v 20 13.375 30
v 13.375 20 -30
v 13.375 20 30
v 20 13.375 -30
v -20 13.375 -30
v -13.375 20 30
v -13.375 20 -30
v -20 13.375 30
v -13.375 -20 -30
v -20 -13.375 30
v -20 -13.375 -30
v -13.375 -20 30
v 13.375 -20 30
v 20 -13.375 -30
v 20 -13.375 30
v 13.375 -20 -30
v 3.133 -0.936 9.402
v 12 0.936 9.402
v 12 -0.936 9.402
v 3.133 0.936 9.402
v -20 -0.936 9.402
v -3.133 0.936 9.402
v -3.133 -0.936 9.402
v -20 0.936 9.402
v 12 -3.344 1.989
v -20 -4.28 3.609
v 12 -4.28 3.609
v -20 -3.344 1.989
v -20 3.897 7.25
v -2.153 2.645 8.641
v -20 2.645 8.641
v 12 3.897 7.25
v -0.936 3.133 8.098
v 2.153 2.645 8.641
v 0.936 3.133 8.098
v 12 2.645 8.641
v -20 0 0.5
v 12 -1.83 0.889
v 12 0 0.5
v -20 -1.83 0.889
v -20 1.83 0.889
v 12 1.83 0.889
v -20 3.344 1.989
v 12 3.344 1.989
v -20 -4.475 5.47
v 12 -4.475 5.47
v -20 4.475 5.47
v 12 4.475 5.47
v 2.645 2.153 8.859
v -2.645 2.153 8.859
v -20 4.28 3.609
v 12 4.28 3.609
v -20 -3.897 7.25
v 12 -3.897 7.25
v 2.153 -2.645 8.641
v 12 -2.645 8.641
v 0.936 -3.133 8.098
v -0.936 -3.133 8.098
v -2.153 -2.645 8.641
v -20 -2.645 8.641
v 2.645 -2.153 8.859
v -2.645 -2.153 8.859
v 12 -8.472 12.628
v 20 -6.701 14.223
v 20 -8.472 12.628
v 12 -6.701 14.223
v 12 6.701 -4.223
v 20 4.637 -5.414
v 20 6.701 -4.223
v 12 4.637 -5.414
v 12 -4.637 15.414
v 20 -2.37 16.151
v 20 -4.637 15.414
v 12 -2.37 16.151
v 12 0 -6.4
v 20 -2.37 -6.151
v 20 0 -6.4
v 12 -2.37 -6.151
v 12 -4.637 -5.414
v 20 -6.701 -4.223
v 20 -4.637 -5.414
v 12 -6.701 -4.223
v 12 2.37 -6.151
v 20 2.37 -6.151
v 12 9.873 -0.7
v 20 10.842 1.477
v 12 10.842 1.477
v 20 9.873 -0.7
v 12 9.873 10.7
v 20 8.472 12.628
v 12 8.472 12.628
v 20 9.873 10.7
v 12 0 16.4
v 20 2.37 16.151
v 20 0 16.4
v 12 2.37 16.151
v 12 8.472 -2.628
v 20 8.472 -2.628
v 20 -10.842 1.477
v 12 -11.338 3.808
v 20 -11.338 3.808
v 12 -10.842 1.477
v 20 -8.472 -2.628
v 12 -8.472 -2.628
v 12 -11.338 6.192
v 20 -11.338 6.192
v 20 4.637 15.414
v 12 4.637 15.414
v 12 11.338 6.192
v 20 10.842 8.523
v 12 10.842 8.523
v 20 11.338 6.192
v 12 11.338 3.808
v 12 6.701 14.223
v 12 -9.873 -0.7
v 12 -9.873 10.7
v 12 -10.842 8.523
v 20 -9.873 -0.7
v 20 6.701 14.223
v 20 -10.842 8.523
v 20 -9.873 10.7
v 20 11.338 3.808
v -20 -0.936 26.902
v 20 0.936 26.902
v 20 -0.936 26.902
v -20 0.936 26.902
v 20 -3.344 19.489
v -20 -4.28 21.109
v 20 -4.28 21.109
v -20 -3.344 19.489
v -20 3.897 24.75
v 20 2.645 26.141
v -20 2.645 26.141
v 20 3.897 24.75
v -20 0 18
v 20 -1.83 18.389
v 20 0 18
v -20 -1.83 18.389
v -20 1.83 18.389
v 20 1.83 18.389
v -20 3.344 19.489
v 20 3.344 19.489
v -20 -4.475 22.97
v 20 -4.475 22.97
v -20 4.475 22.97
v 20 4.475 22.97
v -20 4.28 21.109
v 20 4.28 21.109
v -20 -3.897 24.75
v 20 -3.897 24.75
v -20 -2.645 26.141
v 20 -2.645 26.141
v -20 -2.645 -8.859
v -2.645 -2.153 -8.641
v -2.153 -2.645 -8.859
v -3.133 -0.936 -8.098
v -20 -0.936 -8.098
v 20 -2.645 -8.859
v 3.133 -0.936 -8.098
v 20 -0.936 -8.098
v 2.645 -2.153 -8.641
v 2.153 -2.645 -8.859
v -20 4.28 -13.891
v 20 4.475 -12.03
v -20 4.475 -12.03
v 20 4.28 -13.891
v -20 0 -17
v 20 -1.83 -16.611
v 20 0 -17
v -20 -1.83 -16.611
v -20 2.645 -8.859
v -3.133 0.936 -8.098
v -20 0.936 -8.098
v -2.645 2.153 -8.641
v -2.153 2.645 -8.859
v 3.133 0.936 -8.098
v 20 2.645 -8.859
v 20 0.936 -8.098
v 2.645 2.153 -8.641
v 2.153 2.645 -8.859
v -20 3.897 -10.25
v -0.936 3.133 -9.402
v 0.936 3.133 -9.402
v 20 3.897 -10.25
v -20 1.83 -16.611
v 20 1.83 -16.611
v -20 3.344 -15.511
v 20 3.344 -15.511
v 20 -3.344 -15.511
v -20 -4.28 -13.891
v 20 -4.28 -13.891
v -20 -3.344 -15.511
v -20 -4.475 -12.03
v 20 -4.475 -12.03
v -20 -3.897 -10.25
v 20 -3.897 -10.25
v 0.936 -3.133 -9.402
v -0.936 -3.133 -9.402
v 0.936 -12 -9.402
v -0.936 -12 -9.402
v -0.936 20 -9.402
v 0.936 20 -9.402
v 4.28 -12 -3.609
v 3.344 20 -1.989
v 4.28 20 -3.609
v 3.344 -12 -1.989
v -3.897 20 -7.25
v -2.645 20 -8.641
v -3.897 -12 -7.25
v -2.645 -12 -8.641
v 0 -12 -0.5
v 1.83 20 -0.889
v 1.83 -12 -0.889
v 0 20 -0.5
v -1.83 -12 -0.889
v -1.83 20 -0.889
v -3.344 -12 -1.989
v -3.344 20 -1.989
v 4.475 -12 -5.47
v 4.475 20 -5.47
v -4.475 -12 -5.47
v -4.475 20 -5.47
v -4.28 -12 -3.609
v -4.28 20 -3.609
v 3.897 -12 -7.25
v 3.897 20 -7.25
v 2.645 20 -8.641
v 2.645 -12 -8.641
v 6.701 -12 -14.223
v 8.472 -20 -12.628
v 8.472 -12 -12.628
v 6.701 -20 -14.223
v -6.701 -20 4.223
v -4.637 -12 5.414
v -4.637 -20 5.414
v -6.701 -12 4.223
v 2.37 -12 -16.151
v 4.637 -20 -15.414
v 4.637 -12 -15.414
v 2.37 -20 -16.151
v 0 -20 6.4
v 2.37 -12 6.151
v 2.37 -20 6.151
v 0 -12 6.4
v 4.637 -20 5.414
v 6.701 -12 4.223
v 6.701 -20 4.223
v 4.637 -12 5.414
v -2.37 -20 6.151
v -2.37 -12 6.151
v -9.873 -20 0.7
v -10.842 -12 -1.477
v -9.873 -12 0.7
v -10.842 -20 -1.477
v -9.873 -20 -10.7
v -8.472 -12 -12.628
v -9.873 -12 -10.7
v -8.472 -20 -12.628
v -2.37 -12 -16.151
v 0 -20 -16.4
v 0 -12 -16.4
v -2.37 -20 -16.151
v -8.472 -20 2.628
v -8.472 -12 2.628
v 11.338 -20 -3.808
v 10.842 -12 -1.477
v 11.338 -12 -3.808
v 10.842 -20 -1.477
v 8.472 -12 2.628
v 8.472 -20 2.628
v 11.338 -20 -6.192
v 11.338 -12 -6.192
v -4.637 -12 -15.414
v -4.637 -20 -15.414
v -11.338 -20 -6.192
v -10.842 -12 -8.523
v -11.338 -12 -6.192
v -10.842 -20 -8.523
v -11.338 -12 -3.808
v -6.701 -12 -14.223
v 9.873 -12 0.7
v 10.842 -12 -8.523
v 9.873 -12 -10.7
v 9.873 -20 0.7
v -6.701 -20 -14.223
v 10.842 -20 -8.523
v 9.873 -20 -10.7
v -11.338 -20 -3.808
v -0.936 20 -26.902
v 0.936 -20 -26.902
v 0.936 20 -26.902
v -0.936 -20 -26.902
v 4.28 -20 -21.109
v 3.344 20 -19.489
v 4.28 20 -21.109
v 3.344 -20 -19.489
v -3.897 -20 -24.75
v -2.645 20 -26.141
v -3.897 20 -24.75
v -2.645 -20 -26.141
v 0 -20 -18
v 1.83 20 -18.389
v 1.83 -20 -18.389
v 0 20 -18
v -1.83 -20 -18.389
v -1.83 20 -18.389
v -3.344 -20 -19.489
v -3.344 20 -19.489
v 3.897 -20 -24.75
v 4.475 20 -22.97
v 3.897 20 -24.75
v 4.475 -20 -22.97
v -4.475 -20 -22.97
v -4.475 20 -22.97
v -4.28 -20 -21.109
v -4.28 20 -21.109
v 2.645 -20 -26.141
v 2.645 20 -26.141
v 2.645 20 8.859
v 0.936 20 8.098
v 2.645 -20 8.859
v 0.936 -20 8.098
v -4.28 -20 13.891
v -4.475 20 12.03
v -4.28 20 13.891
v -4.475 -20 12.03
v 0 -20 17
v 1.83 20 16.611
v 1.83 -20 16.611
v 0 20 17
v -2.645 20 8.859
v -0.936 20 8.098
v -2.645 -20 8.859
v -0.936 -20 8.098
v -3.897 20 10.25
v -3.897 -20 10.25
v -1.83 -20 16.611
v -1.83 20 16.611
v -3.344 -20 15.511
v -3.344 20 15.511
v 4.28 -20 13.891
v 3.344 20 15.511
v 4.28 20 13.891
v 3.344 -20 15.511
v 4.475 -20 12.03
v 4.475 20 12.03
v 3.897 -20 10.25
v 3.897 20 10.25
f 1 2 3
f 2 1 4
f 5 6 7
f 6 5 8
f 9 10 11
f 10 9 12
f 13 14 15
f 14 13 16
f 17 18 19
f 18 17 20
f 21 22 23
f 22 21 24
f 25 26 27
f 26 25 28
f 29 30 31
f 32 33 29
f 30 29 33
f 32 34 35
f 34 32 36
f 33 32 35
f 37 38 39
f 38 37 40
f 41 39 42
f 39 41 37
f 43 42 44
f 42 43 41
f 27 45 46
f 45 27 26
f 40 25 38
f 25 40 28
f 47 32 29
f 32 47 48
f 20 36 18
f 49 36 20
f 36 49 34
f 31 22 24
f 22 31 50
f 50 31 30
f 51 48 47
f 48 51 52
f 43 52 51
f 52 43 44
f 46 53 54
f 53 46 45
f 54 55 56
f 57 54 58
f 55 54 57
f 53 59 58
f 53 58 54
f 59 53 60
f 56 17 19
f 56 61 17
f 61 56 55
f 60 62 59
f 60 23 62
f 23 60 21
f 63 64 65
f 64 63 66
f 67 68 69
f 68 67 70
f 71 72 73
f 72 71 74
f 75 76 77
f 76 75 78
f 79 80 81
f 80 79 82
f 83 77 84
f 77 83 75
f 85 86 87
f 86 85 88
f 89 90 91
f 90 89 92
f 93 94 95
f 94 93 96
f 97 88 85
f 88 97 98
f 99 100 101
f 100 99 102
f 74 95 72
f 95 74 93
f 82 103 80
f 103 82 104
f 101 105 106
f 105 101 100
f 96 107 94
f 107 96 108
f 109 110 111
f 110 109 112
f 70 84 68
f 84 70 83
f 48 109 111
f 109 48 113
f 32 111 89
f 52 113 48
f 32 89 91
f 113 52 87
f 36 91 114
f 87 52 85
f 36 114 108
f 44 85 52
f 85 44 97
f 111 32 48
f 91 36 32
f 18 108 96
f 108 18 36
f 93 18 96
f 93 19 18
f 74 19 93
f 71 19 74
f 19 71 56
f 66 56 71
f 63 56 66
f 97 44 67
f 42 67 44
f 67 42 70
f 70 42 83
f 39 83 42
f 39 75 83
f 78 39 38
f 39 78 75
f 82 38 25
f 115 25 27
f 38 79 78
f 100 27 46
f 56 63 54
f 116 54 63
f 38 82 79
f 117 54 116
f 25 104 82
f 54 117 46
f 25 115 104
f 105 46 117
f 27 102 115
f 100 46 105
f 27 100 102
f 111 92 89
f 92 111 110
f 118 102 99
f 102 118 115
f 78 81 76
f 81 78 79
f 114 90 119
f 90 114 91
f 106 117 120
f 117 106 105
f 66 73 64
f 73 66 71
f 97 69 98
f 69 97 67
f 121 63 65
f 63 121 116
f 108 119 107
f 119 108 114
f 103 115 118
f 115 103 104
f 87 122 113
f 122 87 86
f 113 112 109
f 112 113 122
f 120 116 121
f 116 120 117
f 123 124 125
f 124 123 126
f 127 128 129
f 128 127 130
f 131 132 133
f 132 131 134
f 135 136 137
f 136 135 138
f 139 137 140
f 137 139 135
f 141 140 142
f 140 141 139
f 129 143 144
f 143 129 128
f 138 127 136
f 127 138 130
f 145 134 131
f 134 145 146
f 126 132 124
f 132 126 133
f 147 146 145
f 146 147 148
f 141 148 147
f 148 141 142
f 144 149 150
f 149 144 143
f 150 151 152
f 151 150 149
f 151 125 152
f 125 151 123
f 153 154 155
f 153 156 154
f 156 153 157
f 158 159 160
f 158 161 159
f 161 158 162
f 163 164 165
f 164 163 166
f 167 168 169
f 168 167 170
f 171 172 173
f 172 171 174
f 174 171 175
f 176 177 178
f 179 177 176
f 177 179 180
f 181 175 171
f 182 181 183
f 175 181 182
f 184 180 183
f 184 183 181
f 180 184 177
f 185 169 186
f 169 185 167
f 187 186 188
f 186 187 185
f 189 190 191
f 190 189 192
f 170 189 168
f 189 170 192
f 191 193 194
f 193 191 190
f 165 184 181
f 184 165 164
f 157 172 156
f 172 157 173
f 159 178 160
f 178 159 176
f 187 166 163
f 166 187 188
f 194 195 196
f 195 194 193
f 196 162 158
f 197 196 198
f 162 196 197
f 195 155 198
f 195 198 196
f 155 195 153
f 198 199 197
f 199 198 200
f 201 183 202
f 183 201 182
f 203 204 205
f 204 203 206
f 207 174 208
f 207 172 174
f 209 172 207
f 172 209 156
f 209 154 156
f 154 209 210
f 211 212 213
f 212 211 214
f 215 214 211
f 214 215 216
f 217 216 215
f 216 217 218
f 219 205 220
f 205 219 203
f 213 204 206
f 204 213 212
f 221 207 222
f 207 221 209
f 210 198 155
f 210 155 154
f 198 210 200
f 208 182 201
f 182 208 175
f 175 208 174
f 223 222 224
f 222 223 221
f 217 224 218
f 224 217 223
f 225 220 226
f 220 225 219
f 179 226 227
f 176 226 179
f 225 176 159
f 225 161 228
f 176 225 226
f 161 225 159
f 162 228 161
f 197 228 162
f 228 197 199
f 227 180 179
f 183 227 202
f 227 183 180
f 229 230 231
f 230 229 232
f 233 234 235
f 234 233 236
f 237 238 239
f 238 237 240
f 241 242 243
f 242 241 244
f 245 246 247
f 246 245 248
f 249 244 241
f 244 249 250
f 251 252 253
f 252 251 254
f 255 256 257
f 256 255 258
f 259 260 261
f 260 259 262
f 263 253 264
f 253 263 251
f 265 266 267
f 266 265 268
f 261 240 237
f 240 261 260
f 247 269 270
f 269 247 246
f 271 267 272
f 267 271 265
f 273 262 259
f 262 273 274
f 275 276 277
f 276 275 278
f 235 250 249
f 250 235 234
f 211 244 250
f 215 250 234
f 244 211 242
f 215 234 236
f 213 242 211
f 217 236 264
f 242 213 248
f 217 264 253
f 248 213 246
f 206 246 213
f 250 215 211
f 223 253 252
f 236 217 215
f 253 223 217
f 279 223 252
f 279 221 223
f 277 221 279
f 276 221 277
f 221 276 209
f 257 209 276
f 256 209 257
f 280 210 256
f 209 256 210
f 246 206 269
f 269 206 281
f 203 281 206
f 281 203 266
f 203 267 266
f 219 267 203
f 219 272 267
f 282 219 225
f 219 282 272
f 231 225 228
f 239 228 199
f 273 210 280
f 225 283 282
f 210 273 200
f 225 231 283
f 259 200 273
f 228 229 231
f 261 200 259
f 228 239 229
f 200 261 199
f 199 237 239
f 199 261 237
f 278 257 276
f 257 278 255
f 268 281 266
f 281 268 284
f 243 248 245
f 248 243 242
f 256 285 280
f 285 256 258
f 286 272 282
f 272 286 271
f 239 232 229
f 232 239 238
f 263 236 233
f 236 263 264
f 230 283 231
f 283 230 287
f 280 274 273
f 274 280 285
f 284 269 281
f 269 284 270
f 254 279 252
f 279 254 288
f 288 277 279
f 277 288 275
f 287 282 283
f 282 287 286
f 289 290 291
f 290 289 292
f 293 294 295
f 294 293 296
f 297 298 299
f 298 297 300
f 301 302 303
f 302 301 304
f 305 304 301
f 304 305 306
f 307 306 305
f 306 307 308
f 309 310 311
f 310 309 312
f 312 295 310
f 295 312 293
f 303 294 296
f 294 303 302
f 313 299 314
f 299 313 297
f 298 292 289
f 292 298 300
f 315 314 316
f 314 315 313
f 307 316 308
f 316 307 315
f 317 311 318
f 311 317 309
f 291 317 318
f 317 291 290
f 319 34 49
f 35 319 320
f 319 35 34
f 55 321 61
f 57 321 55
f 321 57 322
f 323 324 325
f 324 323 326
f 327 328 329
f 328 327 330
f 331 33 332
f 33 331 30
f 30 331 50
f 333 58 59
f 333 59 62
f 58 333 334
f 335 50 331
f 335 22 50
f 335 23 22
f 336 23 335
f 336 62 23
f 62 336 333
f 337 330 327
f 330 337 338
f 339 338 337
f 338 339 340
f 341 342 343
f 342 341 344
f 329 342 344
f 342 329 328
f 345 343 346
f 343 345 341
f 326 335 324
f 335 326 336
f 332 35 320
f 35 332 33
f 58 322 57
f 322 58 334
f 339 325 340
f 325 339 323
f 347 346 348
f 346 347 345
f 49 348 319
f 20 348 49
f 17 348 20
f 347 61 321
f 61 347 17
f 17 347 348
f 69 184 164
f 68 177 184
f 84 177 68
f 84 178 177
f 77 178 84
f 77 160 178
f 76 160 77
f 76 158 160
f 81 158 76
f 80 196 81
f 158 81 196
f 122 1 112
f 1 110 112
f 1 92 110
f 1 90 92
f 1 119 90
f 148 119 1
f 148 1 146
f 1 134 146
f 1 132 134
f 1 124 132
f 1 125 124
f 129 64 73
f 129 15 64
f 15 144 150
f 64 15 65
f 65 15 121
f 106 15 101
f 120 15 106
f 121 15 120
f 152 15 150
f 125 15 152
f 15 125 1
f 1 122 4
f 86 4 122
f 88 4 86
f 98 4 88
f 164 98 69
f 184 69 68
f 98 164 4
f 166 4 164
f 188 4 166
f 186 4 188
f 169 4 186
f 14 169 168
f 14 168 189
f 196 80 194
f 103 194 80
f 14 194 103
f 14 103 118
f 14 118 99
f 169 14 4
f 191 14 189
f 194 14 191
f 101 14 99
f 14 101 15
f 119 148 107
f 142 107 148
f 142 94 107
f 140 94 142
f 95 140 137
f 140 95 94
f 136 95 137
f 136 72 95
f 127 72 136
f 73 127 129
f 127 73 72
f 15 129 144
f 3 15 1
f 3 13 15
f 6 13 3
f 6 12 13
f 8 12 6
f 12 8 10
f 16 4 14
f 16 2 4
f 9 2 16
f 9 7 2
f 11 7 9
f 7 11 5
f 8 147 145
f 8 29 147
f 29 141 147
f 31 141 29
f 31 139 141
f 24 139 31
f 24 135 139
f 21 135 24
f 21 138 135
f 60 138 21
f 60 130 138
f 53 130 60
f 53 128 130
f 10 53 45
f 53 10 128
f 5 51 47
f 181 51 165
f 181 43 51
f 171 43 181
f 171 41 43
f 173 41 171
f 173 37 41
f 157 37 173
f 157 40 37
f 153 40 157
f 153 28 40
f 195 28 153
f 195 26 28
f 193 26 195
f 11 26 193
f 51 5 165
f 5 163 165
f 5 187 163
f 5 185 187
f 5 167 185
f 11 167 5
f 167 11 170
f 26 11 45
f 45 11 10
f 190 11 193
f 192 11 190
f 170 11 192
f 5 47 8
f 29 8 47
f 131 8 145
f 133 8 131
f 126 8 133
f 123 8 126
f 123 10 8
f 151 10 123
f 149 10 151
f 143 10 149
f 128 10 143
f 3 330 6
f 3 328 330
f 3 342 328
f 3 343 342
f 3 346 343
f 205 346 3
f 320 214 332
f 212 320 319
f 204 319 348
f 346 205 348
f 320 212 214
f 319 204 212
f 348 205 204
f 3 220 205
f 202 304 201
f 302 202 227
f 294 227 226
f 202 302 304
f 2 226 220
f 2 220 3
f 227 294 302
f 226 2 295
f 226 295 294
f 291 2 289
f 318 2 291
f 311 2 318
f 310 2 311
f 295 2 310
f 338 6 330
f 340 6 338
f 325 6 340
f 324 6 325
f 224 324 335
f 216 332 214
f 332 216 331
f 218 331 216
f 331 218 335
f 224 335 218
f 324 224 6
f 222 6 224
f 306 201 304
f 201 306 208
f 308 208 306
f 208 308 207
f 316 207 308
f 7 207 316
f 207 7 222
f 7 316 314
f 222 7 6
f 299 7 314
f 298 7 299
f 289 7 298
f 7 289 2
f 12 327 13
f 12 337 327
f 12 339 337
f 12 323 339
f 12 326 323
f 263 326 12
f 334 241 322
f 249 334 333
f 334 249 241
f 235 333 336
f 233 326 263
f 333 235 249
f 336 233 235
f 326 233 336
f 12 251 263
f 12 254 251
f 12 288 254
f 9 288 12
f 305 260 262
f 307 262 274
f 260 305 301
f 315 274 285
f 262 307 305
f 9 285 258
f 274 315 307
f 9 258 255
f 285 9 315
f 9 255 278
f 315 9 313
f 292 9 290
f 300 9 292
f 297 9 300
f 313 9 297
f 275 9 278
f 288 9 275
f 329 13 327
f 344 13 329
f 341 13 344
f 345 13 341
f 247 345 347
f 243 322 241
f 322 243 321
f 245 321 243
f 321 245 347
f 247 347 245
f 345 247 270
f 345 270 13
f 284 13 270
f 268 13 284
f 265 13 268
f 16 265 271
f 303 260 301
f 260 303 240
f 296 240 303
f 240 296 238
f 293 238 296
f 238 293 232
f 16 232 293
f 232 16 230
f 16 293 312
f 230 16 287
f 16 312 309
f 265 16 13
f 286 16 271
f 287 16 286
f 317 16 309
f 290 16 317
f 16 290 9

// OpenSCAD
width=40;
skatedia=22.8;
skatewidth=8;

rodclearance=10;
roddia=9;
lots=100;
height=60;//+rodclearance  ;  // 60;
//mirror([1,0,0]){
difference()
{
	union(){
	cube([width,width,height],center=true);

	}

	for (b = [45,135,225,315]){
		rotate([0,0,b])translate([width*1.09,0,0])cube([width,width,height+10],center=true);


	}


	for(a=[0,90]){
	rotate([0,2*a,a]){
	translate([-35,0,rodclearance/2])rotate([0,90,0])cylinder(r=roddia/2,lots);
	translate([width/2-skatewidth,0,rodclearance/2])rotate([0,90,0])cylinder(r=skatedia/2,lots);
	translate([-lots/2,0,22.5])rotate([0,90,0])cylinder(r=roddia/2,lots);
	translate([-lots/2,0,-12.5])rotate([0,90,0])cylinder(r=roddia/2,lots);

}}




}//}
